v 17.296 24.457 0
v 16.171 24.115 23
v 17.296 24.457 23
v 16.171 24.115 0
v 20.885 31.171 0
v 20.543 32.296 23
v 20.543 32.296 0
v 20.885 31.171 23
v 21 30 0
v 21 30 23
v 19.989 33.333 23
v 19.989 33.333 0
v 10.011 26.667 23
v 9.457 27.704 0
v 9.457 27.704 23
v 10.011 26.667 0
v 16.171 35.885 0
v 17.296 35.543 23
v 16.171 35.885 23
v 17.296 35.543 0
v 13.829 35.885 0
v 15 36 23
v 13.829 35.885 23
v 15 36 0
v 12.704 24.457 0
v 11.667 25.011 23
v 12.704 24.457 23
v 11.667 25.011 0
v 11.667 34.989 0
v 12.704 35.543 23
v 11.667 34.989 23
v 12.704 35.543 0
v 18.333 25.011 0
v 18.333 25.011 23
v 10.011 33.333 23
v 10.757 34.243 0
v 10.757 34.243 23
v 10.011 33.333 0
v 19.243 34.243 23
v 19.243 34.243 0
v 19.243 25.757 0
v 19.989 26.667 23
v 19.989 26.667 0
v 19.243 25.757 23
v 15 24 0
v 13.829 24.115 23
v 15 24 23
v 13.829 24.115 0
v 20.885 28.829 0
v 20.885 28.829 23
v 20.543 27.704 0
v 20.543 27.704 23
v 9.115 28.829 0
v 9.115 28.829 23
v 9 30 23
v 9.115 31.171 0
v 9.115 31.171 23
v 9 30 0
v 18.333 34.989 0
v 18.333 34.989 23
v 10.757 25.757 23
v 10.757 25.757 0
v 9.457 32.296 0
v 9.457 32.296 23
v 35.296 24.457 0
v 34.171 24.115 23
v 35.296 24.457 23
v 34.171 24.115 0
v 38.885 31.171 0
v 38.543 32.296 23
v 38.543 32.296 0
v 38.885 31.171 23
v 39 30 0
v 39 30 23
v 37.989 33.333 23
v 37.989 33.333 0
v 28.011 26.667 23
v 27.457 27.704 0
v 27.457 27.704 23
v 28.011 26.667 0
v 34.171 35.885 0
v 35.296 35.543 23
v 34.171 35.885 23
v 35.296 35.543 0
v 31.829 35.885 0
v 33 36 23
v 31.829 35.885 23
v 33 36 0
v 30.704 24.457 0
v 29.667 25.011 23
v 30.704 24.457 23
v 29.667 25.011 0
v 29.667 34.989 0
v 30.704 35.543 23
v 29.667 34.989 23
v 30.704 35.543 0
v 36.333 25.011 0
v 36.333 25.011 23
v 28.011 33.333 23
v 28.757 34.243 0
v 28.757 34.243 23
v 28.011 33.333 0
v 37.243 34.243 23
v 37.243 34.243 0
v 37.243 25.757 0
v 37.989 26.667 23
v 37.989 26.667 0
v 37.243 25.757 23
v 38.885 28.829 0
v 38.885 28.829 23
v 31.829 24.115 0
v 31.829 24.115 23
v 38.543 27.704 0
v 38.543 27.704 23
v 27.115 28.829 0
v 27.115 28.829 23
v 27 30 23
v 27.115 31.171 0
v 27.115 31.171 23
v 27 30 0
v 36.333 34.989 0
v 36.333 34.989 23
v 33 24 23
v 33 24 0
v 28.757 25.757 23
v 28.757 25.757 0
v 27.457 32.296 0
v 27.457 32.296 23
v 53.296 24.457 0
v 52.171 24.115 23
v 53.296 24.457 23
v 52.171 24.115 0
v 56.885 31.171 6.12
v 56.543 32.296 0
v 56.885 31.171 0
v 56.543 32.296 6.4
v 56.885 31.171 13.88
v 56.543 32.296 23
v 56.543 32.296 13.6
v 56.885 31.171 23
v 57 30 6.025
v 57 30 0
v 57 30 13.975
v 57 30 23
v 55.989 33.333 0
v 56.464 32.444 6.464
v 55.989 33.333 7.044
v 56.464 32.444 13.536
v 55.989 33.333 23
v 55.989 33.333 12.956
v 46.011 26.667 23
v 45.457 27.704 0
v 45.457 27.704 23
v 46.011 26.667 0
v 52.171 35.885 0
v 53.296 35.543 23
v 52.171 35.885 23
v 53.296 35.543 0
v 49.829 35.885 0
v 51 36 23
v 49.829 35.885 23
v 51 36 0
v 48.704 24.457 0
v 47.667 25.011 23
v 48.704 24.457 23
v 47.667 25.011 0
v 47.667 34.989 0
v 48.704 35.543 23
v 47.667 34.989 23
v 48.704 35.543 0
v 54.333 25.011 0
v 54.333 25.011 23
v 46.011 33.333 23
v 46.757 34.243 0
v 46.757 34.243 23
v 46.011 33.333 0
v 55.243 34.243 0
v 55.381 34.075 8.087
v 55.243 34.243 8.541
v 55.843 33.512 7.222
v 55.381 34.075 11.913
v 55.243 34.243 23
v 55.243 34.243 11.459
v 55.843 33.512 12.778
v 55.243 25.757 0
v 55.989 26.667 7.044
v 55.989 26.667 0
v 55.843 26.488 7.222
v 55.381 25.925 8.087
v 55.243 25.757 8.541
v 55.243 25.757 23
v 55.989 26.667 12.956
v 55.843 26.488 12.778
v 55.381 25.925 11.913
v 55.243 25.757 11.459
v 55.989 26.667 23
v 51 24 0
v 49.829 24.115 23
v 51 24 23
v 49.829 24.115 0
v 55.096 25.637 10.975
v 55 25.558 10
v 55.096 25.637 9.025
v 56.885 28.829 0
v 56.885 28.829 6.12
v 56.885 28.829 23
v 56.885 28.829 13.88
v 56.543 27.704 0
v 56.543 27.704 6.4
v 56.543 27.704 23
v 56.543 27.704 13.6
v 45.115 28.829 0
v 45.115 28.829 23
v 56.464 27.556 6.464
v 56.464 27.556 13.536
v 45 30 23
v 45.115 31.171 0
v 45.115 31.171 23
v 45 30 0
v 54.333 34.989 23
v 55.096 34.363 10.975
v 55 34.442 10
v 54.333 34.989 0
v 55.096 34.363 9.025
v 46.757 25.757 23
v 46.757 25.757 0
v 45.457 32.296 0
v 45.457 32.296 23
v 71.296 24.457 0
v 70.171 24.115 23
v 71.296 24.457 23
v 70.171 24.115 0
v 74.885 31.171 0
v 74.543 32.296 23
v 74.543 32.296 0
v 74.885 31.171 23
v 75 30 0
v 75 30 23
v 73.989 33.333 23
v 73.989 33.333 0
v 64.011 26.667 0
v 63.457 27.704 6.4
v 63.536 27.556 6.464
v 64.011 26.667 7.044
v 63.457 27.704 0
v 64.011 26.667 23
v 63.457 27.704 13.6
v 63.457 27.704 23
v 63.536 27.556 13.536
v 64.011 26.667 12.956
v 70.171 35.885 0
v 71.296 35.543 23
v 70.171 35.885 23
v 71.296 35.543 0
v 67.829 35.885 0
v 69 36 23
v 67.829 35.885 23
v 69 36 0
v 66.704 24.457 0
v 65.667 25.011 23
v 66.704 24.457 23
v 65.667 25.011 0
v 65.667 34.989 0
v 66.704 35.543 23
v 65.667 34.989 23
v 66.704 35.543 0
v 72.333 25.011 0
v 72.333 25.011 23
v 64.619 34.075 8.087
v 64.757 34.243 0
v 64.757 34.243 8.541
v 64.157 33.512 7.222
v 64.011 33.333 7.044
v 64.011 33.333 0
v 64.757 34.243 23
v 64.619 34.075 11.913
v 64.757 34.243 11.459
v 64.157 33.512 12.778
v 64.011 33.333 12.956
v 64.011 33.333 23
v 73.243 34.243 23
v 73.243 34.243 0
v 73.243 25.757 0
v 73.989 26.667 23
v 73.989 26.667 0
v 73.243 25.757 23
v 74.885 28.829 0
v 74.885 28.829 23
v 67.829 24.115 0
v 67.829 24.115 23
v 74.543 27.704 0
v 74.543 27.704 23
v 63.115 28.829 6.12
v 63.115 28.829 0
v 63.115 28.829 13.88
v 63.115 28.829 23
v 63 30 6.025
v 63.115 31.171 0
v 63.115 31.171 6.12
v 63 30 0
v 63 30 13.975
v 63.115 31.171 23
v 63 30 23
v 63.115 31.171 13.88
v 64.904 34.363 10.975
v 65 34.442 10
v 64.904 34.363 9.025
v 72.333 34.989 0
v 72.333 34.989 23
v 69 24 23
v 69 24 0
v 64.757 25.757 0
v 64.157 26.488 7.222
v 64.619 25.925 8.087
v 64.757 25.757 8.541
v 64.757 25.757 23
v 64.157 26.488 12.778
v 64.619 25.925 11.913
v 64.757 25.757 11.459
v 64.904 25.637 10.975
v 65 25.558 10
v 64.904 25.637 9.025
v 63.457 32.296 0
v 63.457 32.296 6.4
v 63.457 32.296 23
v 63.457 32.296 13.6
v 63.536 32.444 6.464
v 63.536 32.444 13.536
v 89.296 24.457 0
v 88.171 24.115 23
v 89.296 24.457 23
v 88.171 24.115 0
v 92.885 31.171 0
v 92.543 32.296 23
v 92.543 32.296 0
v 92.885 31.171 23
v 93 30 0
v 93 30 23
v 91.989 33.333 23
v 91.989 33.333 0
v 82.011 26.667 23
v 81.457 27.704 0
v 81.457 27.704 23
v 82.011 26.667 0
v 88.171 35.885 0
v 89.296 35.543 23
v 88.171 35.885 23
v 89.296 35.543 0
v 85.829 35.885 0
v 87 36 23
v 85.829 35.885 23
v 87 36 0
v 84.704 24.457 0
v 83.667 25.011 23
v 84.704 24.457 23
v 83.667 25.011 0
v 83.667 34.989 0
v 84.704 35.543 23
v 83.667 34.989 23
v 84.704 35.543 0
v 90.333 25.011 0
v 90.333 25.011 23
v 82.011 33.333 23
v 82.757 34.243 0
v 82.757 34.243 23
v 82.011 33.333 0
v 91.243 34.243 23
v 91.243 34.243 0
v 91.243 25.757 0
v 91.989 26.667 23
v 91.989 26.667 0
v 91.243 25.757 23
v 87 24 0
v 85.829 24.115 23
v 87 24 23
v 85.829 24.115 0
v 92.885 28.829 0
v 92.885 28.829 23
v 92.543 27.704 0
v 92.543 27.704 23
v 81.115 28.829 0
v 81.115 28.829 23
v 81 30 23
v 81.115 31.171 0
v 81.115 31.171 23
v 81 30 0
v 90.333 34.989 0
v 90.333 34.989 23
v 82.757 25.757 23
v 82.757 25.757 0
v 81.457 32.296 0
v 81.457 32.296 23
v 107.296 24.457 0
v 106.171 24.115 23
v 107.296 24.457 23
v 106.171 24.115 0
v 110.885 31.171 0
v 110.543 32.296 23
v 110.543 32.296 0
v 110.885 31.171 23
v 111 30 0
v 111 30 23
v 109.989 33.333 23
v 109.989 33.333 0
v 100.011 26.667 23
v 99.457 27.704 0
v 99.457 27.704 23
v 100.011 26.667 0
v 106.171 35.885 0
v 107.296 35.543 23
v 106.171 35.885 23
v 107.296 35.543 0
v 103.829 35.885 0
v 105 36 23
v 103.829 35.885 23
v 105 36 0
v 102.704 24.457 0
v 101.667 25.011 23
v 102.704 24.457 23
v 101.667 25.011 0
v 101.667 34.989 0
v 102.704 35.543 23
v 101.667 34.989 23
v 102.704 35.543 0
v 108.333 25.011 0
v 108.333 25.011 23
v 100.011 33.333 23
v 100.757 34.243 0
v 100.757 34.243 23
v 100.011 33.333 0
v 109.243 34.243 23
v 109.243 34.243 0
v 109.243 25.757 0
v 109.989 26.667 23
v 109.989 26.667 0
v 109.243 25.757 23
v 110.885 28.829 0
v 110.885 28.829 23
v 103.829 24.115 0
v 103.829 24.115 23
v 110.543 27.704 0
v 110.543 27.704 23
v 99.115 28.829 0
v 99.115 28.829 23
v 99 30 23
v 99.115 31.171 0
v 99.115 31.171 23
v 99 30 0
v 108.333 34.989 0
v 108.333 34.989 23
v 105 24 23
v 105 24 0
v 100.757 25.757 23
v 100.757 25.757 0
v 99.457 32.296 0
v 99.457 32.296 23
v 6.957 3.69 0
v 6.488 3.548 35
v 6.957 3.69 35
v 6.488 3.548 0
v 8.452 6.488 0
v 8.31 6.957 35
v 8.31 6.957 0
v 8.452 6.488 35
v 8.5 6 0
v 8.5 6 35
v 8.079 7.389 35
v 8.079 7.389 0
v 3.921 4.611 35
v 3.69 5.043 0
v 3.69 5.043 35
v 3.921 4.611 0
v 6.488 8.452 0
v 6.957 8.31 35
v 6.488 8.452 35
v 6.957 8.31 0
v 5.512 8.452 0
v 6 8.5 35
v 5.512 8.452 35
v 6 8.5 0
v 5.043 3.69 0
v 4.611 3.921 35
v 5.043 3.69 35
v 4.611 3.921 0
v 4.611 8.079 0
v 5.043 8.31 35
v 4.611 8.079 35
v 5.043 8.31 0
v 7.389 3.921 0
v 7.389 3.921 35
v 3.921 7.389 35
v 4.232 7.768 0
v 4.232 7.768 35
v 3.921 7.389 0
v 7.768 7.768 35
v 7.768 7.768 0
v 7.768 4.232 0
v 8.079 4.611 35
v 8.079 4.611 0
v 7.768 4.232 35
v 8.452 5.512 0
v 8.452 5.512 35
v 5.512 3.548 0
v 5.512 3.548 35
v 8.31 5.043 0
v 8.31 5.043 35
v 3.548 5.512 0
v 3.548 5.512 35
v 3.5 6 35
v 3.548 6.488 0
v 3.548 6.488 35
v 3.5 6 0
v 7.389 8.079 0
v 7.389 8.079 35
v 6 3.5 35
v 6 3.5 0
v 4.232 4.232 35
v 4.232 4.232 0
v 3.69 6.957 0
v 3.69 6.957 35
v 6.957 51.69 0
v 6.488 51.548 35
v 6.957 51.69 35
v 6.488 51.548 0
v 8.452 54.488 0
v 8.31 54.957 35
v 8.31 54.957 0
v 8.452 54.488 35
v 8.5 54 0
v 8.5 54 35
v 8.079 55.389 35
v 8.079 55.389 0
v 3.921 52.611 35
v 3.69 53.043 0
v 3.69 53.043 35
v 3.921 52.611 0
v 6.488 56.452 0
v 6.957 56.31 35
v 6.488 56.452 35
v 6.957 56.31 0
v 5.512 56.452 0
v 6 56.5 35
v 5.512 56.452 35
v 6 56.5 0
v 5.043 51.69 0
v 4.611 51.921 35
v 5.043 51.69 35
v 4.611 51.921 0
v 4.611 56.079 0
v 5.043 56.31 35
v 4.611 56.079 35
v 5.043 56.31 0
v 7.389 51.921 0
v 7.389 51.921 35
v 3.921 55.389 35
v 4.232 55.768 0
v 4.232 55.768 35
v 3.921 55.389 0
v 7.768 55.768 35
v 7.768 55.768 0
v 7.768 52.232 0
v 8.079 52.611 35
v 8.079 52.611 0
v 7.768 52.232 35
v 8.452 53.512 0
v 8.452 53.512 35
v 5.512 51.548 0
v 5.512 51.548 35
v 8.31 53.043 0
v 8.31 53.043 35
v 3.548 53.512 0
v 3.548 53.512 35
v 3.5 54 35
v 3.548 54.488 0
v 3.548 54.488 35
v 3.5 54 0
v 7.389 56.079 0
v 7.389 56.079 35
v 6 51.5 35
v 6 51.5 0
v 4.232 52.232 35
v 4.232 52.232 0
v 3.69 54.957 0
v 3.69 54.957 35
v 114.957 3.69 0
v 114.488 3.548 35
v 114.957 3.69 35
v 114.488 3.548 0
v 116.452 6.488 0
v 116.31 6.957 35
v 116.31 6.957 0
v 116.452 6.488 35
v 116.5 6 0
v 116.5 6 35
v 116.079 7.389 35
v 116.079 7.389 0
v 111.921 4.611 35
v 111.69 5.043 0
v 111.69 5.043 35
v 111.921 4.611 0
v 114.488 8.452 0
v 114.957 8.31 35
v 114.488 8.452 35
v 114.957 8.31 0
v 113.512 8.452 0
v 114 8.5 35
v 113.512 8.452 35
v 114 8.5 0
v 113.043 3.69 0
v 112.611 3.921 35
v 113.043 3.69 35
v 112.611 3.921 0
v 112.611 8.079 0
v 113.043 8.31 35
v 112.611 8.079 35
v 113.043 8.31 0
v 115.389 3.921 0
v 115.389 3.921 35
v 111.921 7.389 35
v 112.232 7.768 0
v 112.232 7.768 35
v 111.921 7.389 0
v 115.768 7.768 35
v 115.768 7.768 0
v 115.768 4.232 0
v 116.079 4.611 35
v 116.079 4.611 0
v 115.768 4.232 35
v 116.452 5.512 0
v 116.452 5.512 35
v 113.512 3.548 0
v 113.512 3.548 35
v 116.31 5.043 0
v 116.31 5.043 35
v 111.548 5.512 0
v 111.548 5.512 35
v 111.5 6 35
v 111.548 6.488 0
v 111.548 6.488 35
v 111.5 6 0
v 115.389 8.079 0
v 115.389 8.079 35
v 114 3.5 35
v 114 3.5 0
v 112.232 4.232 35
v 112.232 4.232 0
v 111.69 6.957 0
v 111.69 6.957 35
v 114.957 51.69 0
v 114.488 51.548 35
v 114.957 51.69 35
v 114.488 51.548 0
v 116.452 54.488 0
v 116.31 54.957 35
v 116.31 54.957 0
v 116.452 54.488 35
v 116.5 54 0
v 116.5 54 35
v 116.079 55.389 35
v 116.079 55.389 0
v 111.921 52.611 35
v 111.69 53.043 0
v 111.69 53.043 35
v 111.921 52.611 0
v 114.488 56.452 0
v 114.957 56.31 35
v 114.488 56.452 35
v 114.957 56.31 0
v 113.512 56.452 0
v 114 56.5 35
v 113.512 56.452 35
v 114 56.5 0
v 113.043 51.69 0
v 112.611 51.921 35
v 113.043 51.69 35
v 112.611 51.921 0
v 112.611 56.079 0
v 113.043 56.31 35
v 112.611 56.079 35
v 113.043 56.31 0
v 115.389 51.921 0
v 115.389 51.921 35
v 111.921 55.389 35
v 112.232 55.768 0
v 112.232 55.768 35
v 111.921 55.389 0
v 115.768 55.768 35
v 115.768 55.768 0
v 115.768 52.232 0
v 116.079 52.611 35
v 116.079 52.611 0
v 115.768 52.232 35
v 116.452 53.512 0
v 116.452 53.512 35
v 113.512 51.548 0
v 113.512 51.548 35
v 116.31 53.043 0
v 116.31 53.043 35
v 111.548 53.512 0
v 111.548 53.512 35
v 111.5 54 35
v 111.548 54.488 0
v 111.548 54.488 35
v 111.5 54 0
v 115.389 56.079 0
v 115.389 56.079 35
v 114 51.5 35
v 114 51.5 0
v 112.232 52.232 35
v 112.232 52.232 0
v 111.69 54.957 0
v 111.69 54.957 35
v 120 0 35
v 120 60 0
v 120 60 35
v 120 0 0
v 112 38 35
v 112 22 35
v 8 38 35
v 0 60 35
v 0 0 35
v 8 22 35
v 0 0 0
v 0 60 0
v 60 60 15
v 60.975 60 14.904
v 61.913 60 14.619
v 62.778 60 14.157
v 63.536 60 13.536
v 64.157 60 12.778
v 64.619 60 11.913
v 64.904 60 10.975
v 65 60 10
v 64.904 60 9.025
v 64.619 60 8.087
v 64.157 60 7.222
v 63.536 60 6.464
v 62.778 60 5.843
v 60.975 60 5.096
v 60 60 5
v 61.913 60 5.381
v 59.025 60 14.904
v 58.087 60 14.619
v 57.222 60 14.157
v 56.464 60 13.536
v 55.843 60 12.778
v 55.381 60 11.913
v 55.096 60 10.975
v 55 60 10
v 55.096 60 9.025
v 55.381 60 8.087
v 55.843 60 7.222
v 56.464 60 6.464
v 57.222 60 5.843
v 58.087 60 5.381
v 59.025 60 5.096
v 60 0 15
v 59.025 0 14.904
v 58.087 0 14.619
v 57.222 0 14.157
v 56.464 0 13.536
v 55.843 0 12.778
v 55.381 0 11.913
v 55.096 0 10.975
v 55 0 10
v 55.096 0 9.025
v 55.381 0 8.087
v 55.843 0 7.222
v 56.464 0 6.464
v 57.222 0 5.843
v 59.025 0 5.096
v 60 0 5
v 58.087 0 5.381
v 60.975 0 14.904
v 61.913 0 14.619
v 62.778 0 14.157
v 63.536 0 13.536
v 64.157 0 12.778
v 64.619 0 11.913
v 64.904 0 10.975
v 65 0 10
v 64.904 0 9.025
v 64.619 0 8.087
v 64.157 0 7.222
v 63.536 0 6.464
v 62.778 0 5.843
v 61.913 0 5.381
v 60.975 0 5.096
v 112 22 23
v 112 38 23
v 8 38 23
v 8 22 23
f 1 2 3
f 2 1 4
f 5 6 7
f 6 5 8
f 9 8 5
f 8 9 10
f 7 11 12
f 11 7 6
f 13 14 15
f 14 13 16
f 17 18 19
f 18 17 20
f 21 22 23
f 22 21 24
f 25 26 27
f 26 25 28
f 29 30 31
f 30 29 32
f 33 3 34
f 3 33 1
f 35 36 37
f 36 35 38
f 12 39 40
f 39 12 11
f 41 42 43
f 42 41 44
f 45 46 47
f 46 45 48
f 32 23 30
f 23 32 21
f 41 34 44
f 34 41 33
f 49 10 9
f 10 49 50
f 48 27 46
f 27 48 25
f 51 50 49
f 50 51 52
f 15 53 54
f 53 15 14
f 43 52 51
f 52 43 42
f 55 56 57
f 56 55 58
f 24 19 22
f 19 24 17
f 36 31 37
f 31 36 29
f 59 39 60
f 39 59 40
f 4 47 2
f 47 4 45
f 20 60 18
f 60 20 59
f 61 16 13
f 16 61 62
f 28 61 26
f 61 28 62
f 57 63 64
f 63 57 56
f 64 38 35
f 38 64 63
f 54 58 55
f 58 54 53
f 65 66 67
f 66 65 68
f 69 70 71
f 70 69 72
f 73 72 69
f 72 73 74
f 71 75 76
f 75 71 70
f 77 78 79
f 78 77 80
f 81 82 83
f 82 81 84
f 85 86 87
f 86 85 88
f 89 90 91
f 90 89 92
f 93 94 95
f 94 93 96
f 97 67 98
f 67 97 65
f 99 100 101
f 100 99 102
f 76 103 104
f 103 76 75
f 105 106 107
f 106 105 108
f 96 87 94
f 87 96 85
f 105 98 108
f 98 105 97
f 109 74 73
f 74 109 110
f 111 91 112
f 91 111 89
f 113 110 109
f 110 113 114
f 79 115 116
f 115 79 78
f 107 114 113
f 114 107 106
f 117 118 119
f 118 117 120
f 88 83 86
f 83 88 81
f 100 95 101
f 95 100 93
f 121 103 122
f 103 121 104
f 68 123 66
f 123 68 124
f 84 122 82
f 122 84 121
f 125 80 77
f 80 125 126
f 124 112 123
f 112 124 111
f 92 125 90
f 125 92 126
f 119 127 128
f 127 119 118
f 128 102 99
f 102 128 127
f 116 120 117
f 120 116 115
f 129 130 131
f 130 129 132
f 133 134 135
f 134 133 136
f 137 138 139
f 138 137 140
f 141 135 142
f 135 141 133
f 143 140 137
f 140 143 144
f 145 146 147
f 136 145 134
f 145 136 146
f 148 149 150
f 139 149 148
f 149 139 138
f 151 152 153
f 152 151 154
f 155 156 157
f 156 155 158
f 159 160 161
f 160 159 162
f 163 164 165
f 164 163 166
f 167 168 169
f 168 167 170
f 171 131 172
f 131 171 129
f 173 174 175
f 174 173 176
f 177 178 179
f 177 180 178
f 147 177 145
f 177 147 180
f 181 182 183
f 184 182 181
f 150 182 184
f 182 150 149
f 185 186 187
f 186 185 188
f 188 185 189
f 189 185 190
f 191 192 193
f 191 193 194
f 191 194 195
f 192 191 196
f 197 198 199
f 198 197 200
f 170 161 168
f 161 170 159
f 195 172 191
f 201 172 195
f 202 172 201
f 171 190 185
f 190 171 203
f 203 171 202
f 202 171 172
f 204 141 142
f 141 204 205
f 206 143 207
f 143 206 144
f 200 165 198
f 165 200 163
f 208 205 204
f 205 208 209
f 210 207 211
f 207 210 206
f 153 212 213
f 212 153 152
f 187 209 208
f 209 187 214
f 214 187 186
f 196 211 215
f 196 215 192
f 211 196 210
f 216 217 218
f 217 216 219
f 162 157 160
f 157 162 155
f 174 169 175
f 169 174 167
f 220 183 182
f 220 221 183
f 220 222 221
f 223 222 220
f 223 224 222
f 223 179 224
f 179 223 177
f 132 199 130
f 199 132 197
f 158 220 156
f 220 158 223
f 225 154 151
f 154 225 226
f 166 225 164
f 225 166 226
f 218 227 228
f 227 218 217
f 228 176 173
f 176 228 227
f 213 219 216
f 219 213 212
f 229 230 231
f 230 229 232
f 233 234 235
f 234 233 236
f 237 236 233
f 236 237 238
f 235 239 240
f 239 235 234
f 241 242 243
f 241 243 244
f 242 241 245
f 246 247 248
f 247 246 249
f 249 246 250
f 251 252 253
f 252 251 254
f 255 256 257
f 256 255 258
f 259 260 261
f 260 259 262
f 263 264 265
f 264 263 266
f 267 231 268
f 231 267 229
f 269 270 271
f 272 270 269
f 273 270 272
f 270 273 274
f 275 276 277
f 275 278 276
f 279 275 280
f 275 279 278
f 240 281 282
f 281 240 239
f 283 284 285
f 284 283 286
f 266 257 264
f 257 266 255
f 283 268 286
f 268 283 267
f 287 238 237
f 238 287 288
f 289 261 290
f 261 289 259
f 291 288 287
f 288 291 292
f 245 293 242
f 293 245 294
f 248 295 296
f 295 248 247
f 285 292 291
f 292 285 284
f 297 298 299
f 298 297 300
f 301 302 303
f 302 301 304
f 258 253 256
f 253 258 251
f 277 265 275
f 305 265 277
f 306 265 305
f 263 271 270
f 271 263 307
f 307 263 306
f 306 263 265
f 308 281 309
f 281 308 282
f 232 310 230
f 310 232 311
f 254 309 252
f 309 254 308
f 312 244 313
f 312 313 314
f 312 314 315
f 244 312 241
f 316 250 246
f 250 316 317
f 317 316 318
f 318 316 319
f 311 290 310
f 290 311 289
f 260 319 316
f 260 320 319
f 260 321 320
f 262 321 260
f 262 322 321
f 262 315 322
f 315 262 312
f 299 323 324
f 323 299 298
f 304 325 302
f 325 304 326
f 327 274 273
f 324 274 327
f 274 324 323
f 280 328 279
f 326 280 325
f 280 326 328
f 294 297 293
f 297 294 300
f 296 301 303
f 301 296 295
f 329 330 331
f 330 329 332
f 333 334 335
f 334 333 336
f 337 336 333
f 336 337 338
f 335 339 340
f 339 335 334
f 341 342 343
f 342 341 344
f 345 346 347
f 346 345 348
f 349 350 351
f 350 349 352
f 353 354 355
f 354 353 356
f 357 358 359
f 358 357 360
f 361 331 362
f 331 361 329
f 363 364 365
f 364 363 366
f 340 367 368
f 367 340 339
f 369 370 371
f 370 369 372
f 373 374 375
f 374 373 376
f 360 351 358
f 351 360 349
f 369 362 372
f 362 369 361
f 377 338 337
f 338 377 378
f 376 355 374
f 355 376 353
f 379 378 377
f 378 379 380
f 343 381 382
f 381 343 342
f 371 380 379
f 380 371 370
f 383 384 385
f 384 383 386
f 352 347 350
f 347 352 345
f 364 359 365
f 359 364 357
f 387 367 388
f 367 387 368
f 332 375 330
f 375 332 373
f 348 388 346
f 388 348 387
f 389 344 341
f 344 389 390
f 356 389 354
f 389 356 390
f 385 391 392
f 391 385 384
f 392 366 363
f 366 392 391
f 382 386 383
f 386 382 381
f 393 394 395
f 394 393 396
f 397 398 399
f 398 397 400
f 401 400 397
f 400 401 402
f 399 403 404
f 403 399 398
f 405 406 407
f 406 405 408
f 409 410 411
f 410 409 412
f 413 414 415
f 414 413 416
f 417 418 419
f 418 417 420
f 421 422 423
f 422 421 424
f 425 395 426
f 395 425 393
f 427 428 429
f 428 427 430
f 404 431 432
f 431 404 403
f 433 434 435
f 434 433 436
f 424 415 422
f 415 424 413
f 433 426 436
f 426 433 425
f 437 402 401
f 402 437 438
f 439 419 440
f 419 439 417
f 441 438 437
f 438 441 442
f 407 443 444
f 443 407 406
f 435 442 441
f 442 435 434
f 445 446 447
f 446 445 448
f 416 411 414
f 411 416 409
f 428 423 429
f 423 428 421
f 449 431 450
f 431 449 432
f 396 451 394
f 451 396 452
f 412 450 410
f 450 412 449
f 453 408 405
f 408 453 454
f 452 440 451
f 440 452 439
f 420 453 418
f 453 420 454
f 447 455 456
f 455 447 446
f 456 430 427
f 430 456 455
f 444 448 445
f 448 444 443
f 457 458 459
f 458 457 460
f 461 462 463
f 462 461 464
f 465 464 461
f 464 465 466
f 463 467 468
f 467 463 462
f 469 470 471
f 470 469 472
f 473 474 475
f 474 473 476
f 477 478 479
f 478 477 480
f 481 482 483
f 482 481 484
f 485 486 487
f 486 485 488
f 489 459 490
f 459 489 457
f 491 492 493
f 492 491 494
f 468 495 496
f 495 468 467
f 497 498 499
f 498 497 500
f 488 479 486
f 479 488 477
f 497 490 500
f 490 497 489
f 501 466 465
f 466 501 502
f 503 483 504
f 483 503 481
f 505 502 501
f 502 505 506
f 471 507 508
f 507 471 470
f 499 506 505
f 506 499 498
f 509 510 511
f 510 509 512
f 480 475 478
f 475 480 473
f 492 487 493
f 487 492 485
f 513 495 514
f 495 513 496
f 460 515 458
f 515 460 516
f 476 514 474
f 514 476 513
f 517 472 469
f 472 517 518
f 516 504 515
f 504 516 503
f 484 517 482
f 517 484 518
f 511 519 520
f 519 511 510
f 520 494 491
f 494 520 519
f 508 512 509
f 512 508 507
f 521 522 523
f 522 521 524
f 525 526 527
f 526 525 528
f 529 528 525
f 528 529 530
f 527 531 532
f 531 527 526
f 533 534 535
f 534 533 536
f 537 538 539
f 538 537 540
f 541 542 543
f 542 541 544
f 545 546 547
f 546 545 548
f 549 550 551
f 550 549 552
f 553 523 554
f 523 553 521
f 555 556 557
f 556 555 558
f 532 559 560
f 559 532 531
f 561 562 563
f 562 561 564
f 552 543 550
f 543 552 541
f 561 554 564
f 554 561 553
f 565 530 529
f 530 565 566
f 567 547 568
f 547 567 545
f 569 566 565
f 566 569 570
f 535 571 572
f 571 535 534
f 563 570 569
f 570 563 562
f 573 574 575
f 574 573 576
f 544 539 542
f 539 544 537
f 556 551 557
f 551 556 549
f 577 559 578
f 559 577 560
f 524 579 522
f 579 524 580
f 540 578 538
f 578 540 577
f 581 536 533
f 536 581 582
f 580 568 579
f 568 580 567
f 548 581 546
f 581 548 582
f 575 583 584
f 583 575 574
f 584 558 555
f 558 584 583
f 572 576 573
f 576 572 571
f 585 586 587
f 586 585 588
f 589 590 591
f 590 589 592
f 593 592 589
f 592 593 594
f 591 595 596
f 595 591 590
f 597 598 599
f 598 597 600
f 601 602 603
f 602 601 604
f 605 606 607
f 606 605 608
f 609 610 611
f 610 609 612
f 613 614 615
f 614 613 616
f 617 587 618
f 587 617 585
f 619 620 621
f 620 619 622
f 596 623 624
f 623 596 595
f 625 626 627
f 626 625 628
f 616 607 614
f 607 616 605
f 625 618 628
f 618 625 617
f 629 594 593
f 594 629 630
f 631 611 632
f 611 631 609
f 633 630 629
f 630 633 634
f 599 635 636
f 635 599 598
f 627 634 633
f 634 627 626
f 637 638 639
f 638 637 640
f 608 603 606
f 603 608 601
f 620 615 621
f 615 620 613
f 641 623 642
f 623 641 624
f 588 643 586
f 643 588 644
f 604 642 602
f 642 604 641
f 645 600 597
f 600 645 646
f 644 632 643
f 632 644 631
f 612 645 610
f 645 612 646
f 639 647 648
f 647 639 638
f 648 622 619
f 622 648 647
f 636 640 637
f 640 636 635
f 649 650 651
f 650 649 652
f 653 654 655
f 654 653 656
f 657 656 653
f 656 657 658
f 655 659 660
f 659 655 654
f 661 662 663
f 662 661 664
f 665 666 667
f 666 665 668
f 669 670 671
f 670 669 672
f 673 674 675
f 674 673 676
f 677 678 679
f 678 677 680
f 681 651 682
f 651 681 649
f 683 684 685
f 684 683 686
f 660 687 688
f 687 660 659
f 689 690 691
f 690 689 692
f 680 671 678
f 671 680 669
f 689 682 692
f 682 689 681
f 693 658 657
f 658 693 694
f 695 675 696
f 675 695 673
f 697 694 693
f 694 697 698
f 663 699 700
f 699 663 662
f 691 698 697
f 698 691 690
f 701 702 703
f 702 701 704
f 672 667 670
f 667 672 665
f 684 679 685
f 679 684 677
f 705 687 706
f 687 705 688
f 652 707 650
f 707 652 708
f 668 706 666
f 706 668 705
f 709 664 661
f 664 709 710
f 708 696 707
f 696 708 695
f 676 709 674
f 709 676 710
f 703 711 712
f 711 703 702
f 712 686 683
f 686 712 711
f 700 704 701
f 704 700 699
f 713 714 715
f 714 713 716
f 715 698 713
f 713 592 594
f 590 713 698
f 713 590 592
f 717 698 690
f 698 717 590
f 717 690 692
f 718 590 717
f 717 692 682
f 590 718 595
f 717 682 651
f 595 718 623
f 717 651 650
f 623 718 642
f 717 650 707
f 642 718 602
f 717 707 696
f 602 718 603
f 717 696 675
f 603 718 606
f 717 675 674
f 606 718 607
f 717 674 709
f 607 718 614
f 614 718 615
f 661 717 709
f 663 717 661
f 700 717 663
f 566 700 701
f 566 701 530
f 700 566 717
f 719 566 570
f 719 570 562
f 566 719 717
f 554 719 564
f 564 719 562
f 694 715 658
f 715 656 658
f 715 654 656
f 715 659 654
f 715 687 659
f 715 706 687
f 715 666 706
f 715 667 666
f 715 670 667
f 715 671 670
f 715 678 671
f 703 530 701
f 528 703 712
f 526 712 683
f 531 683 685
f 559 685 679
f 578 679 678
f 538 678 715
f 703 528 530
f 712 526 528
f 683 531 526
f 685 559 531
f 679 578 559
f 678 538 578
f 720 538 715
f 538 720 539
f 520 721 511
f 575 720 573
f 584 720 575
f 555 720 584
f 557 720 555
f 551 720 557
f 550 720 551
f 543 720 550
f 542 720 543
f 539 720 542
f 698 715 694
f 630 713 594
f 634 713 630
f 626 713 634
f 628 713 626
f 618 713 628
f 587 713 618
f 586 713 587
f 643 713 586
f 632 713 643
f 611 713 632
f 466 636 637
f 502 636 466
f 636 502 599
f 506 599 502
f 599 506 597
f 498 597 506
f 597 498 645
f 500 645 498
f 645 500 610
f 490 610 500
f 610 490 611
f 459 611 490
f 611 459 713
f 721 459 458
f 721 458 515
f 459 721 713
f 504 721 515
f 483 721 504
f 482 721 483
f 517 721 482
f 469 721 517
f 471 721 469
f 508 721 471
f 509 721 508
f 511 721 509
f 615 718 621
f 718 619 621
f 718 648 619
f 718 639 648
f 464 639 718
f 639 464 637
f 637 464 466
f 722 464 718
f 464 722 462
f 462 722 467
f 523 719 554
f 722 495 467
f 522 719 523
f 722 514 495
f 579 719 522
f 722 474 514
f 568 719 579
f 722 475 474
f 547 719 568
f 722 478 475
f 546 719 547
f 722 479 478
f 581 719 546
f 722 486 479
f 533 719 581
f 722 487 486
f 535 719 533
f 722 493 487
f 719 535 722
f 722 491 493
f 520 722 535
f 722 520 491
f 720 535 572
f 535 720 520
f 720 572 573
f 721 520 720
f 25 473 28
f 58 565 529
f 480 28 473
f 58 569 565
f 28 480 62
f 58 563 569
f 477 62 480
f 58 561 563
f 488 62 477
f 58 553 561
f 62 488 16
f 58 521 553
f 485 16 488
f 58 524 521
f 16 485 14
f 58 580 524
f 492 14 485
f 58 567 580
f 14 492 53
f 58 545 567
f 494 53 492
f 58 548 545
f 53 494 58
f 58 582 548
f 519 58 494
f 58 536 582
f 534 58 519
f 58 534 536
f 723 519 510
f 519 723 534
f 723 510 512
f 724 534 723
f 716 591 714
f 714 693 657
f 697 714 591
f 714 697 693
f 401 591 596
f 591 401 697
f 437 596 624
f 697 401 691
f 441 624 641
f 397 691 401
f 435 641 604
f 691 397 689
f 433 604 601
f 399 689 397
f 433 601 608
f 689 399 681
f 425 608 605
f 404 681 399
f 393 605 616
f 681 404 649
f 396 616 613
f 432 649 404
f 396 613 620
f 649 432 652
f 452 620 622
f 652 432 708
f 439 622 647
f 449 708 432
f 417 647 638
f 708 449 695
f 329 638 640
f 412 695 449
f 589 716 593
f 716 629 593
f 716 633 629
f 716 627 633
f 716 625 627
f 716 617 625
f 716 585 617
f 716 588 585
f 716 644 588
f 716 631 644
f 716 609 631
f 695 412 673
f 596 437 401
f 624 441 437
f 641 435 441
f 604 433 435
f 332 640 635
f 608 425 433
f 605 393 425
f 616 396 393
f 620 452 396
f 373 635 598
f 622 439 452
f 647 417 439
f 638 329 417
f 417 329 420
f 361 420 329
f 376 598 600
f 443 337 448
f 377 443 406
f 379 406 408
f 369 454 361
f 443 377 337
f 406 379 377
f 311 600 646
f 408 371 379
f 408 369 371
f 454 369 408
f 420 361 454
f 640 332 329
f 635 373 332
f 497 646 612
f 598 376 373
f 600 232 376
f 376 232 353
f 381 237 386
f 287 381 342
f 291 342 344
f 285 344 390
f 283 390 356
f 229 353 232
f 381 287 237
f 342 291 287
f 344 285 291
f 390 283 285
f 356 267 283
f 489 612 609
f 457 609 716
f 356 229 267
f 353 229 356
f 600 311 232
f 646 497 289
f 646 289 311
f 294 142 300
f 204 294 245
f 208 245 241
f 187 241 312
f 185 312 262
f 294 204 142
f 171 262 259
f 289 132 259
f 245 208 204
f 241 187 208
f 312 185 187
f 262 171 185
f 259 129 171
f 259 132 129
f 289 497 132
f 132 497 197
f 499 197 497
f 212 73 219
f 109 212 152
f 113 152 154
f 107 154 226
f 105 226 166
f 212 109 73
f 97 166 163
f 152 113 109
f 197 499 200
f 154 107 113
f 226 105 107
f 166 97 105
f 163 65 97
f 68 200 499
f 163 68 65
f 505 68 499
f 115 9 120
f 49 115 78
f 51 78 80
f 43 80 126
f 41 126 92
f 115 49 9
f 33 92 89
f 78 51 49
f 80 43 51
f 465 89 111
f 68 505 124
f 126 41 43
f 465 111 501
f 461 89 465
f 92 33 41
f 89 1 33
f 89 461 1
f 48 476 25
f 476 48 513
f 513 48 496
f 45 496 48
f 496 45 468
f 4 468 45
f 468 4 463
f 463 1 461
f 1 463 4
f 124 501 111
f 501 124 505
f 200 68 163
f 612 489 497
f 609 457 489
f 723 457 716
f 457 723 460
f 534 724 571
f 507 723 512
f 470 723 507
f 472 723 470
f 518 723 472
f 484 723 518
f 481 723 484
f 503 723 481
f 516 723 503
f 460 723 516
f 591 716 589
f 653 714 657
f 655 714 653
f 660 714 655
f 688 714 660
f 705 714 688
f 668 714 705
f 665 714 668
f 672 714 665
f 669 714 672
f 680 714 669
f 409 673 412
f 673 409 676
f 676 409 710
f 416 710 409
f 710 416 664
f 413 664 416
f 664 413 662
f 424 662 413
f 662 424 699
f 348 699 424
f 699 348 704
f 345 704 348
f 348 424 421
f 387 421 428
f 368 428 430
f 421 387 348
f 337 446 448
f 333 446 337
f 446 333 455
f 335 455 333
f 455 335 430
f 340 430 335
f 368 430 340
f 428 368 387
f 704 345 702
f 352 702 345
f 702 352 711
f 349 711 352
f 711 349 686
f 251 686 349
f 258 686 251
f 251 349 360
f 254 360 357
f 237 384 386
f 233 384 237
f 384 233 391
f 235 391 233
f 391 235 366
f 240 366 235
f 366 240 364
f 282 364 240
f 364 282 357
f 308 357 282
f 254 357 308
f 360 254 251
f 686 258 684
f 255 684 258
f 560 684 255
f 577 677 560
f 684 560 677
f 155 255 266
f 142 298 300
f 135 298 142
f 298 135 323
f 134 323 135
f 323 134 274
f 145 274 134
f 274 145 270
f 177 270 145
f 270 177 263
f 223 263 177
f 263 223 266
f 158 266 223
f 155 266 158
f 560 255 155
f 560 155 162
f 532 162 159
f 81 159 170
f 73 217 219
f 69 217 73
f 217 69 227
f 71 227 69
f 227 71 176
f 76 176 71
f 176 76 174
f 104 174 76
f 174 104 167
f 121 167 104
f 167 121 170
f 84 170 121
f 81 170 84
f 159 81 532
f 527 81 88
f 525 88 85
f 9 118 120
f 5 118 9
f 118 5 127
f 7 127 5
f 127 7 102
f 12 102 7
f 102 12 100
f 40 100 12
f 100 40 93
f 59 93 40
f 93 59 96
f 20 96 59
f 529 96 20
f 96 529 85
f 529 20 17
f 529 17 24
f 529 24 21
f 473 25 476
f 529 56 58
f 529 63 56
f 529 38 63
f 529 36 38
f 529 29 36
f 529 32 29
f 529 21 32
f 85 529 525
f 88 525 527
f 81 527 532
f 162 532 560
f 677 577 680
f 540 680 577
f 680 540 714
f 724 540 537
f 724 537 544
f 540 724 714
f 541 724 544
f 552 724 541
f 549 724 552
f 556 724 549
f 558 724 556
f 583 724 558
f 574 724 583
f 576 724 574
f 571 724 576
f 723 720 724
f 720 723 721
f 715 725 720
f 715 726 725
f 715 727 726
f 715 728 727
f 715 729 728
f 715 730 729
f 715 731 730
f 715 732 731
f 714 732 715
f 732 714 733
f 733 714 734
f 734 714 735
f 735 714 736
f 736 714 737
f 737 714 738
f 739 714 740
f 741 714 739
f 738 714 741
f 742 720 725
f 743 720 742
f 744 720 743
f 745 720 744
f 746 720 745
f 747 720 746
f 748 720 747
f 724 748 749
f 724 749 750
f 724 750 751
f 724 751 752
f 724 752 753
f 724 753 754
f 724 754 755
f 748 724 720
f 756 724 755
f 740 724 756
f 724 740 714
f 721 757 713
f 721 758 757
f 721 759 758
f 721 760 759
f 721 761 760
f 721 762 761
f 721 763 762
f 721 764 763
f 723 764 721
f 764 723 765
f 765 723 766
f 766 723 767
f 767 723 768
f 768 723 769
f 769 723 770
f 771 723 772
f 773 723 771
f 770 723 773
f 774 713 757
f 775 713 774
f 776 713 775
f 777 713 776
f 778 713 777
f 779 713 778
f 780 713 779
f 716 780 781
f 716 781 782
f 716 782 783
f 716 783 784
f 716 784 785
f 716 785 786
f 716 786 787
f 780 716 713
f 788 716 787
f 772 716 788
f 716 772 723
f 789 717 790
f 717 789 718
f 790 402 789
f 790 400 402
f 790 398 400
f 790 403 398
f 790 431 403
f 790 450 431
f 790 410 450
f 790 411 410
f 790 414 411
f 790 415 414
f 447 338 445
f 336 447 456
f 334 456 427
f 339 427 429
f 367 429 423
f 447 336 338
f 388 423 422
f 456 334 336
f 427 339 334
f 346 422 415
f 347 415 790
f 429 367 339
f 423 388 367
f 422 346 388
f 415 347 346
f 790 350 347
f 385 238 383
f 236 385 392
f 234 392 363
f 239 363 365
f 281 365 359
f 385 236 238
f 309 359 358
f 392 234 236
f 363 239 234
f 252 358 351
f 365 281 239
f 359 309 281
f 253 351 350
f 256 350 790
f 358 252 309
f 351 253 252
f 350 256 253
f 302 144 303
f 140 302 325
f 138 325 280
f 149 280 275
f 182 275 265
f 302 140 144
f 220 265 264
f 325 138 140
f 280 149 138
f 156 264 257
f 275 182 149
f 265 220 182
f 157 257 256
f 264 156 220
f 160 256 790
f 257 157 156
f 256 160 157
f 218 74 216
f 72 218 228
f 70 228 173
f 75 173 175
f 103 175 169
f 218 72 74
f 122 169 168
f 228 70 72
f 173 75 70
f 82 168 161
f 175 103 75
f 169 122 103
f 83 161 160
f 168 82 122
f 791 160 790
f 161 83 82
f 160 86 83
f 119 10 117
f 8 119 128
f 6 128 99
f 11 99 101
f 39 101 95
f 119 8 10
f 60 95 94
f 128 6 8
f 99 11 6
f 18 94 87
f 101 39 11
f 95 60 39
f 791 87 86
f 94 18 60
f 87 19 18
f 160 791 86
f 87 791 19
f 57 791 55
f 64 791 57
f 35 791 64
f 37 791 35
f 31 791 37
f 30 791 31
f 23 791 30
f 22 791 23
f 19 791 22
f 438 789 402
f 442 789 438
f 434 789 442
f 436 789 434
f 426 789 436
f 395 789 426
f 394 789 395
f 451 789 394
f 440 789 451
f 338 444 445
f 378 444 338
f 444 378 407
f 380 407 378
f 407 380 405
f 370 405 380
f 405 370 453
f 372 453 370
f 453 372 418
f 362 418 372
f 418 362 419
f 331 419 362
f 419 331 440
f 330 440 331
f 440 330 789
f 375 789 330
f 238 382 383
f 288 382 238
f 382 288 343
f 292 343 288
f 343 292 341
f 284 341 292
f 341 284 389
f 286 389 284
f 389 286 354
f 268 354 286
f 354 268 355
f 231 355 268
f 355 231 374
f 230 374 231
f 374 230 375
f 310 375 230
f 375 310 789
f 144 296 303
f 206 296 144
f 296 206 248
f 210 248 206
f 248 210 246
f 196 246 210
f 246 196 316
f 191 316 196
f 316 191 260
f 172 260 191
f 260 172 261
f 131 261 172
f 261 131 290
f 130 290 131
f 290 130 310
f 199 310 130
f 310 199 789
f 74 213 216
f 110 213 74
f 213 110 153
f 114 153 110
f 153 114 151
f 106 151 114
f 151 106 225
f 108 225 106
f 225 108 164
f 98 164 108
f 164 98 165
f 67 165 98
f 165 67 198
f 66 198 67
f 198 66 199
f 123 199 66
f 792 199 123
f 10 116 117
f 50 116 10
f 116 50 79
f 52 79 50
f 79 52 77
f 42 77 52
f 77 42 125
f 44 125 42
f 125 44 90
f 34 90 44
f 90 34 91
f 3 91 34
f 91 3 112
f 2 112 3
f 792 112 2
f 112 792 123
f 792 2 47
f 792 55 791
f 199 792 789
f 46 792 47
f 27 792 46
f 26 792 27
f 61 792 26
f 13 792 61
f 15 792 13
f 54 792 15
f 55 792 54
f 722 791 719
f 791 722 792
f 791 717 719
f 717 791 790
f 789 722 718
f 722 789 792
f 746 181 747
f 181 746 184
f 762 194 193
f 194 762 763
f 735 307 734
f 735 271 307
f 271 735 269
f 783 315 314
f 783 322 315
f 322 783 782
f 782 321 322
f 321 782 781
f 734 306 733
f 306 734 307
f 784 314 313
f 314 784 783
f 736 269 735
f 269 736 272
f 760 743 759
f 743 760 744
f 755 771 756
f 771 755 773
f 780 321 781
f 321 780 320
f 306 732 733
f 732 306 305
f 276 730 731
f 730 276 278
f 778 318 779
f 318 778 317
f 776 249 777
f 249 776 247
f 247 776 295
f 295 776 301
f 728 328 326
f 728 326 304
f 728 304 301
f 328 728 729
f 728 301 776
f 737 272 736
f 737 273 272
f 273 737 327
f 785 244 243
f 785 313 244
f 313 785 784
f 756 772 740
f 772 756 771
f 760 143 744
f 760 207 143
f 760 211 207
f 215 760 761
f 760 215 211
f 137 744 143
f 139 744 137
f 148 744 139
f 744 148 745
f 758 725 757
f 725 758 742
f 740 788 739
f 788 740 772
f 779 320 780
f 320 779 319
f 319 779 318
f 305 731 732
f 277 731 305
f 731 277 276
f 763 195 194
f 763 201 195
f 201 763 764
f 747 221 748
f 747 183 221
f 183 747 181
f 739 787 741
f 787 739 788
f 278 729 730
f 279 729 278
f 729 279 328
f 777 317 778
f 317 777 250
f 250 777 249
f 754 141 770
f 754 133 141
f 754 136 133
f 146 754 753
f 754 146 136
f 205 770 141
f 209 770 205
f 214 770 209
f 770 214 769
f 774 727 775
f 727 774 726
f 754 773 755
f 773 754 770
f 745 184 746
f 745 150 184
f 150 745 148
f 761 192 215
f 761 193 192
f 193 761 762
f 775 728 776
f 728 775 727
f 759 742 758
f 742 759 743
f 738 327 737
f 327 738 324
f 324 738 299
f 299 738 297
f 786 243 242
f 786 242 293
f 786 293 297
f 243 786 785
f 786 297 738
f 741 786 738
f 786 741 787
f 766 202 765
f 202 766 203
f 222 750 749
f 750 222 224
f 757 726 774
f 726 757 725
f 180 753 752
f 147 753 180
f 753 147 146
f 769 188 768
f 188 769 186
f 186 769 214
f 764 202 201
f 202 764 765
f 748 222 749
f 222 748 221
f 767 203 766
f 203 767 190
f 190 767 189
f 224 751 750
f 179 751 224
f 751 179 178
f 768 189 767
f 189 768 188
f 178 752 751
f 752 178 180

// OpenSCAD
$fn = 32;

// ----------------------------------------------------------------------
// Manifold block: side_outlet manifold
// ----------------------------------------------------------------------

// --- parameters (mm) ---
block_l = 120;            // block length, X
block_w = 60;             // block width, Y
block_h = 35;             // block height, Z
port_d = 12;              // port bore diameter
port_pitch = 18;          // port pitch along X
gallery_d = 16;           // top gallery width, Y
gallery_depth = 12;       // gallery pocket depth
wall_p = 8;               // gallery end wall thickness, X
mnt_d = 5;                // mounting hole diameter
mnt_in = 6;               // mounting hole inset from the edges
out_d = 10;               // outlet bore diameter
out_z = 10;               // outlet axis height

n_ports = 6;  // ports in the row
port_x0 = (block_l - (n_ports - 1) * port_pitch) / 2;  // first port X

difference() {
  cube([block_l, block_w, block_h]);
  for (i = [0 : n_ports - 1])
    translate([port_x0 + i * port_pitch, block_w / 2, -1])
      cylinder(h = block_h + 2, d = port_d);
  translate([wall_p, block_w / 2 - gallery_d / 2, block_h - gallery_depth])
    cube([block_l - 2 * wall_p, gallery_d, gallery_depth + 1]);
  for (cx = [mnt_in, block_l - mnt_in])
    for (cy = [mnt_in, block_w - mnt_in])
      translate([cx, cy, -1]) cylinder(h = block_h + 2, d = mnt_d);
  translate([block_l / 2, -1, out_z]) rotate([-90, 0, 0])
    cylinder(h = block_w + 2, d = out_d);
}
